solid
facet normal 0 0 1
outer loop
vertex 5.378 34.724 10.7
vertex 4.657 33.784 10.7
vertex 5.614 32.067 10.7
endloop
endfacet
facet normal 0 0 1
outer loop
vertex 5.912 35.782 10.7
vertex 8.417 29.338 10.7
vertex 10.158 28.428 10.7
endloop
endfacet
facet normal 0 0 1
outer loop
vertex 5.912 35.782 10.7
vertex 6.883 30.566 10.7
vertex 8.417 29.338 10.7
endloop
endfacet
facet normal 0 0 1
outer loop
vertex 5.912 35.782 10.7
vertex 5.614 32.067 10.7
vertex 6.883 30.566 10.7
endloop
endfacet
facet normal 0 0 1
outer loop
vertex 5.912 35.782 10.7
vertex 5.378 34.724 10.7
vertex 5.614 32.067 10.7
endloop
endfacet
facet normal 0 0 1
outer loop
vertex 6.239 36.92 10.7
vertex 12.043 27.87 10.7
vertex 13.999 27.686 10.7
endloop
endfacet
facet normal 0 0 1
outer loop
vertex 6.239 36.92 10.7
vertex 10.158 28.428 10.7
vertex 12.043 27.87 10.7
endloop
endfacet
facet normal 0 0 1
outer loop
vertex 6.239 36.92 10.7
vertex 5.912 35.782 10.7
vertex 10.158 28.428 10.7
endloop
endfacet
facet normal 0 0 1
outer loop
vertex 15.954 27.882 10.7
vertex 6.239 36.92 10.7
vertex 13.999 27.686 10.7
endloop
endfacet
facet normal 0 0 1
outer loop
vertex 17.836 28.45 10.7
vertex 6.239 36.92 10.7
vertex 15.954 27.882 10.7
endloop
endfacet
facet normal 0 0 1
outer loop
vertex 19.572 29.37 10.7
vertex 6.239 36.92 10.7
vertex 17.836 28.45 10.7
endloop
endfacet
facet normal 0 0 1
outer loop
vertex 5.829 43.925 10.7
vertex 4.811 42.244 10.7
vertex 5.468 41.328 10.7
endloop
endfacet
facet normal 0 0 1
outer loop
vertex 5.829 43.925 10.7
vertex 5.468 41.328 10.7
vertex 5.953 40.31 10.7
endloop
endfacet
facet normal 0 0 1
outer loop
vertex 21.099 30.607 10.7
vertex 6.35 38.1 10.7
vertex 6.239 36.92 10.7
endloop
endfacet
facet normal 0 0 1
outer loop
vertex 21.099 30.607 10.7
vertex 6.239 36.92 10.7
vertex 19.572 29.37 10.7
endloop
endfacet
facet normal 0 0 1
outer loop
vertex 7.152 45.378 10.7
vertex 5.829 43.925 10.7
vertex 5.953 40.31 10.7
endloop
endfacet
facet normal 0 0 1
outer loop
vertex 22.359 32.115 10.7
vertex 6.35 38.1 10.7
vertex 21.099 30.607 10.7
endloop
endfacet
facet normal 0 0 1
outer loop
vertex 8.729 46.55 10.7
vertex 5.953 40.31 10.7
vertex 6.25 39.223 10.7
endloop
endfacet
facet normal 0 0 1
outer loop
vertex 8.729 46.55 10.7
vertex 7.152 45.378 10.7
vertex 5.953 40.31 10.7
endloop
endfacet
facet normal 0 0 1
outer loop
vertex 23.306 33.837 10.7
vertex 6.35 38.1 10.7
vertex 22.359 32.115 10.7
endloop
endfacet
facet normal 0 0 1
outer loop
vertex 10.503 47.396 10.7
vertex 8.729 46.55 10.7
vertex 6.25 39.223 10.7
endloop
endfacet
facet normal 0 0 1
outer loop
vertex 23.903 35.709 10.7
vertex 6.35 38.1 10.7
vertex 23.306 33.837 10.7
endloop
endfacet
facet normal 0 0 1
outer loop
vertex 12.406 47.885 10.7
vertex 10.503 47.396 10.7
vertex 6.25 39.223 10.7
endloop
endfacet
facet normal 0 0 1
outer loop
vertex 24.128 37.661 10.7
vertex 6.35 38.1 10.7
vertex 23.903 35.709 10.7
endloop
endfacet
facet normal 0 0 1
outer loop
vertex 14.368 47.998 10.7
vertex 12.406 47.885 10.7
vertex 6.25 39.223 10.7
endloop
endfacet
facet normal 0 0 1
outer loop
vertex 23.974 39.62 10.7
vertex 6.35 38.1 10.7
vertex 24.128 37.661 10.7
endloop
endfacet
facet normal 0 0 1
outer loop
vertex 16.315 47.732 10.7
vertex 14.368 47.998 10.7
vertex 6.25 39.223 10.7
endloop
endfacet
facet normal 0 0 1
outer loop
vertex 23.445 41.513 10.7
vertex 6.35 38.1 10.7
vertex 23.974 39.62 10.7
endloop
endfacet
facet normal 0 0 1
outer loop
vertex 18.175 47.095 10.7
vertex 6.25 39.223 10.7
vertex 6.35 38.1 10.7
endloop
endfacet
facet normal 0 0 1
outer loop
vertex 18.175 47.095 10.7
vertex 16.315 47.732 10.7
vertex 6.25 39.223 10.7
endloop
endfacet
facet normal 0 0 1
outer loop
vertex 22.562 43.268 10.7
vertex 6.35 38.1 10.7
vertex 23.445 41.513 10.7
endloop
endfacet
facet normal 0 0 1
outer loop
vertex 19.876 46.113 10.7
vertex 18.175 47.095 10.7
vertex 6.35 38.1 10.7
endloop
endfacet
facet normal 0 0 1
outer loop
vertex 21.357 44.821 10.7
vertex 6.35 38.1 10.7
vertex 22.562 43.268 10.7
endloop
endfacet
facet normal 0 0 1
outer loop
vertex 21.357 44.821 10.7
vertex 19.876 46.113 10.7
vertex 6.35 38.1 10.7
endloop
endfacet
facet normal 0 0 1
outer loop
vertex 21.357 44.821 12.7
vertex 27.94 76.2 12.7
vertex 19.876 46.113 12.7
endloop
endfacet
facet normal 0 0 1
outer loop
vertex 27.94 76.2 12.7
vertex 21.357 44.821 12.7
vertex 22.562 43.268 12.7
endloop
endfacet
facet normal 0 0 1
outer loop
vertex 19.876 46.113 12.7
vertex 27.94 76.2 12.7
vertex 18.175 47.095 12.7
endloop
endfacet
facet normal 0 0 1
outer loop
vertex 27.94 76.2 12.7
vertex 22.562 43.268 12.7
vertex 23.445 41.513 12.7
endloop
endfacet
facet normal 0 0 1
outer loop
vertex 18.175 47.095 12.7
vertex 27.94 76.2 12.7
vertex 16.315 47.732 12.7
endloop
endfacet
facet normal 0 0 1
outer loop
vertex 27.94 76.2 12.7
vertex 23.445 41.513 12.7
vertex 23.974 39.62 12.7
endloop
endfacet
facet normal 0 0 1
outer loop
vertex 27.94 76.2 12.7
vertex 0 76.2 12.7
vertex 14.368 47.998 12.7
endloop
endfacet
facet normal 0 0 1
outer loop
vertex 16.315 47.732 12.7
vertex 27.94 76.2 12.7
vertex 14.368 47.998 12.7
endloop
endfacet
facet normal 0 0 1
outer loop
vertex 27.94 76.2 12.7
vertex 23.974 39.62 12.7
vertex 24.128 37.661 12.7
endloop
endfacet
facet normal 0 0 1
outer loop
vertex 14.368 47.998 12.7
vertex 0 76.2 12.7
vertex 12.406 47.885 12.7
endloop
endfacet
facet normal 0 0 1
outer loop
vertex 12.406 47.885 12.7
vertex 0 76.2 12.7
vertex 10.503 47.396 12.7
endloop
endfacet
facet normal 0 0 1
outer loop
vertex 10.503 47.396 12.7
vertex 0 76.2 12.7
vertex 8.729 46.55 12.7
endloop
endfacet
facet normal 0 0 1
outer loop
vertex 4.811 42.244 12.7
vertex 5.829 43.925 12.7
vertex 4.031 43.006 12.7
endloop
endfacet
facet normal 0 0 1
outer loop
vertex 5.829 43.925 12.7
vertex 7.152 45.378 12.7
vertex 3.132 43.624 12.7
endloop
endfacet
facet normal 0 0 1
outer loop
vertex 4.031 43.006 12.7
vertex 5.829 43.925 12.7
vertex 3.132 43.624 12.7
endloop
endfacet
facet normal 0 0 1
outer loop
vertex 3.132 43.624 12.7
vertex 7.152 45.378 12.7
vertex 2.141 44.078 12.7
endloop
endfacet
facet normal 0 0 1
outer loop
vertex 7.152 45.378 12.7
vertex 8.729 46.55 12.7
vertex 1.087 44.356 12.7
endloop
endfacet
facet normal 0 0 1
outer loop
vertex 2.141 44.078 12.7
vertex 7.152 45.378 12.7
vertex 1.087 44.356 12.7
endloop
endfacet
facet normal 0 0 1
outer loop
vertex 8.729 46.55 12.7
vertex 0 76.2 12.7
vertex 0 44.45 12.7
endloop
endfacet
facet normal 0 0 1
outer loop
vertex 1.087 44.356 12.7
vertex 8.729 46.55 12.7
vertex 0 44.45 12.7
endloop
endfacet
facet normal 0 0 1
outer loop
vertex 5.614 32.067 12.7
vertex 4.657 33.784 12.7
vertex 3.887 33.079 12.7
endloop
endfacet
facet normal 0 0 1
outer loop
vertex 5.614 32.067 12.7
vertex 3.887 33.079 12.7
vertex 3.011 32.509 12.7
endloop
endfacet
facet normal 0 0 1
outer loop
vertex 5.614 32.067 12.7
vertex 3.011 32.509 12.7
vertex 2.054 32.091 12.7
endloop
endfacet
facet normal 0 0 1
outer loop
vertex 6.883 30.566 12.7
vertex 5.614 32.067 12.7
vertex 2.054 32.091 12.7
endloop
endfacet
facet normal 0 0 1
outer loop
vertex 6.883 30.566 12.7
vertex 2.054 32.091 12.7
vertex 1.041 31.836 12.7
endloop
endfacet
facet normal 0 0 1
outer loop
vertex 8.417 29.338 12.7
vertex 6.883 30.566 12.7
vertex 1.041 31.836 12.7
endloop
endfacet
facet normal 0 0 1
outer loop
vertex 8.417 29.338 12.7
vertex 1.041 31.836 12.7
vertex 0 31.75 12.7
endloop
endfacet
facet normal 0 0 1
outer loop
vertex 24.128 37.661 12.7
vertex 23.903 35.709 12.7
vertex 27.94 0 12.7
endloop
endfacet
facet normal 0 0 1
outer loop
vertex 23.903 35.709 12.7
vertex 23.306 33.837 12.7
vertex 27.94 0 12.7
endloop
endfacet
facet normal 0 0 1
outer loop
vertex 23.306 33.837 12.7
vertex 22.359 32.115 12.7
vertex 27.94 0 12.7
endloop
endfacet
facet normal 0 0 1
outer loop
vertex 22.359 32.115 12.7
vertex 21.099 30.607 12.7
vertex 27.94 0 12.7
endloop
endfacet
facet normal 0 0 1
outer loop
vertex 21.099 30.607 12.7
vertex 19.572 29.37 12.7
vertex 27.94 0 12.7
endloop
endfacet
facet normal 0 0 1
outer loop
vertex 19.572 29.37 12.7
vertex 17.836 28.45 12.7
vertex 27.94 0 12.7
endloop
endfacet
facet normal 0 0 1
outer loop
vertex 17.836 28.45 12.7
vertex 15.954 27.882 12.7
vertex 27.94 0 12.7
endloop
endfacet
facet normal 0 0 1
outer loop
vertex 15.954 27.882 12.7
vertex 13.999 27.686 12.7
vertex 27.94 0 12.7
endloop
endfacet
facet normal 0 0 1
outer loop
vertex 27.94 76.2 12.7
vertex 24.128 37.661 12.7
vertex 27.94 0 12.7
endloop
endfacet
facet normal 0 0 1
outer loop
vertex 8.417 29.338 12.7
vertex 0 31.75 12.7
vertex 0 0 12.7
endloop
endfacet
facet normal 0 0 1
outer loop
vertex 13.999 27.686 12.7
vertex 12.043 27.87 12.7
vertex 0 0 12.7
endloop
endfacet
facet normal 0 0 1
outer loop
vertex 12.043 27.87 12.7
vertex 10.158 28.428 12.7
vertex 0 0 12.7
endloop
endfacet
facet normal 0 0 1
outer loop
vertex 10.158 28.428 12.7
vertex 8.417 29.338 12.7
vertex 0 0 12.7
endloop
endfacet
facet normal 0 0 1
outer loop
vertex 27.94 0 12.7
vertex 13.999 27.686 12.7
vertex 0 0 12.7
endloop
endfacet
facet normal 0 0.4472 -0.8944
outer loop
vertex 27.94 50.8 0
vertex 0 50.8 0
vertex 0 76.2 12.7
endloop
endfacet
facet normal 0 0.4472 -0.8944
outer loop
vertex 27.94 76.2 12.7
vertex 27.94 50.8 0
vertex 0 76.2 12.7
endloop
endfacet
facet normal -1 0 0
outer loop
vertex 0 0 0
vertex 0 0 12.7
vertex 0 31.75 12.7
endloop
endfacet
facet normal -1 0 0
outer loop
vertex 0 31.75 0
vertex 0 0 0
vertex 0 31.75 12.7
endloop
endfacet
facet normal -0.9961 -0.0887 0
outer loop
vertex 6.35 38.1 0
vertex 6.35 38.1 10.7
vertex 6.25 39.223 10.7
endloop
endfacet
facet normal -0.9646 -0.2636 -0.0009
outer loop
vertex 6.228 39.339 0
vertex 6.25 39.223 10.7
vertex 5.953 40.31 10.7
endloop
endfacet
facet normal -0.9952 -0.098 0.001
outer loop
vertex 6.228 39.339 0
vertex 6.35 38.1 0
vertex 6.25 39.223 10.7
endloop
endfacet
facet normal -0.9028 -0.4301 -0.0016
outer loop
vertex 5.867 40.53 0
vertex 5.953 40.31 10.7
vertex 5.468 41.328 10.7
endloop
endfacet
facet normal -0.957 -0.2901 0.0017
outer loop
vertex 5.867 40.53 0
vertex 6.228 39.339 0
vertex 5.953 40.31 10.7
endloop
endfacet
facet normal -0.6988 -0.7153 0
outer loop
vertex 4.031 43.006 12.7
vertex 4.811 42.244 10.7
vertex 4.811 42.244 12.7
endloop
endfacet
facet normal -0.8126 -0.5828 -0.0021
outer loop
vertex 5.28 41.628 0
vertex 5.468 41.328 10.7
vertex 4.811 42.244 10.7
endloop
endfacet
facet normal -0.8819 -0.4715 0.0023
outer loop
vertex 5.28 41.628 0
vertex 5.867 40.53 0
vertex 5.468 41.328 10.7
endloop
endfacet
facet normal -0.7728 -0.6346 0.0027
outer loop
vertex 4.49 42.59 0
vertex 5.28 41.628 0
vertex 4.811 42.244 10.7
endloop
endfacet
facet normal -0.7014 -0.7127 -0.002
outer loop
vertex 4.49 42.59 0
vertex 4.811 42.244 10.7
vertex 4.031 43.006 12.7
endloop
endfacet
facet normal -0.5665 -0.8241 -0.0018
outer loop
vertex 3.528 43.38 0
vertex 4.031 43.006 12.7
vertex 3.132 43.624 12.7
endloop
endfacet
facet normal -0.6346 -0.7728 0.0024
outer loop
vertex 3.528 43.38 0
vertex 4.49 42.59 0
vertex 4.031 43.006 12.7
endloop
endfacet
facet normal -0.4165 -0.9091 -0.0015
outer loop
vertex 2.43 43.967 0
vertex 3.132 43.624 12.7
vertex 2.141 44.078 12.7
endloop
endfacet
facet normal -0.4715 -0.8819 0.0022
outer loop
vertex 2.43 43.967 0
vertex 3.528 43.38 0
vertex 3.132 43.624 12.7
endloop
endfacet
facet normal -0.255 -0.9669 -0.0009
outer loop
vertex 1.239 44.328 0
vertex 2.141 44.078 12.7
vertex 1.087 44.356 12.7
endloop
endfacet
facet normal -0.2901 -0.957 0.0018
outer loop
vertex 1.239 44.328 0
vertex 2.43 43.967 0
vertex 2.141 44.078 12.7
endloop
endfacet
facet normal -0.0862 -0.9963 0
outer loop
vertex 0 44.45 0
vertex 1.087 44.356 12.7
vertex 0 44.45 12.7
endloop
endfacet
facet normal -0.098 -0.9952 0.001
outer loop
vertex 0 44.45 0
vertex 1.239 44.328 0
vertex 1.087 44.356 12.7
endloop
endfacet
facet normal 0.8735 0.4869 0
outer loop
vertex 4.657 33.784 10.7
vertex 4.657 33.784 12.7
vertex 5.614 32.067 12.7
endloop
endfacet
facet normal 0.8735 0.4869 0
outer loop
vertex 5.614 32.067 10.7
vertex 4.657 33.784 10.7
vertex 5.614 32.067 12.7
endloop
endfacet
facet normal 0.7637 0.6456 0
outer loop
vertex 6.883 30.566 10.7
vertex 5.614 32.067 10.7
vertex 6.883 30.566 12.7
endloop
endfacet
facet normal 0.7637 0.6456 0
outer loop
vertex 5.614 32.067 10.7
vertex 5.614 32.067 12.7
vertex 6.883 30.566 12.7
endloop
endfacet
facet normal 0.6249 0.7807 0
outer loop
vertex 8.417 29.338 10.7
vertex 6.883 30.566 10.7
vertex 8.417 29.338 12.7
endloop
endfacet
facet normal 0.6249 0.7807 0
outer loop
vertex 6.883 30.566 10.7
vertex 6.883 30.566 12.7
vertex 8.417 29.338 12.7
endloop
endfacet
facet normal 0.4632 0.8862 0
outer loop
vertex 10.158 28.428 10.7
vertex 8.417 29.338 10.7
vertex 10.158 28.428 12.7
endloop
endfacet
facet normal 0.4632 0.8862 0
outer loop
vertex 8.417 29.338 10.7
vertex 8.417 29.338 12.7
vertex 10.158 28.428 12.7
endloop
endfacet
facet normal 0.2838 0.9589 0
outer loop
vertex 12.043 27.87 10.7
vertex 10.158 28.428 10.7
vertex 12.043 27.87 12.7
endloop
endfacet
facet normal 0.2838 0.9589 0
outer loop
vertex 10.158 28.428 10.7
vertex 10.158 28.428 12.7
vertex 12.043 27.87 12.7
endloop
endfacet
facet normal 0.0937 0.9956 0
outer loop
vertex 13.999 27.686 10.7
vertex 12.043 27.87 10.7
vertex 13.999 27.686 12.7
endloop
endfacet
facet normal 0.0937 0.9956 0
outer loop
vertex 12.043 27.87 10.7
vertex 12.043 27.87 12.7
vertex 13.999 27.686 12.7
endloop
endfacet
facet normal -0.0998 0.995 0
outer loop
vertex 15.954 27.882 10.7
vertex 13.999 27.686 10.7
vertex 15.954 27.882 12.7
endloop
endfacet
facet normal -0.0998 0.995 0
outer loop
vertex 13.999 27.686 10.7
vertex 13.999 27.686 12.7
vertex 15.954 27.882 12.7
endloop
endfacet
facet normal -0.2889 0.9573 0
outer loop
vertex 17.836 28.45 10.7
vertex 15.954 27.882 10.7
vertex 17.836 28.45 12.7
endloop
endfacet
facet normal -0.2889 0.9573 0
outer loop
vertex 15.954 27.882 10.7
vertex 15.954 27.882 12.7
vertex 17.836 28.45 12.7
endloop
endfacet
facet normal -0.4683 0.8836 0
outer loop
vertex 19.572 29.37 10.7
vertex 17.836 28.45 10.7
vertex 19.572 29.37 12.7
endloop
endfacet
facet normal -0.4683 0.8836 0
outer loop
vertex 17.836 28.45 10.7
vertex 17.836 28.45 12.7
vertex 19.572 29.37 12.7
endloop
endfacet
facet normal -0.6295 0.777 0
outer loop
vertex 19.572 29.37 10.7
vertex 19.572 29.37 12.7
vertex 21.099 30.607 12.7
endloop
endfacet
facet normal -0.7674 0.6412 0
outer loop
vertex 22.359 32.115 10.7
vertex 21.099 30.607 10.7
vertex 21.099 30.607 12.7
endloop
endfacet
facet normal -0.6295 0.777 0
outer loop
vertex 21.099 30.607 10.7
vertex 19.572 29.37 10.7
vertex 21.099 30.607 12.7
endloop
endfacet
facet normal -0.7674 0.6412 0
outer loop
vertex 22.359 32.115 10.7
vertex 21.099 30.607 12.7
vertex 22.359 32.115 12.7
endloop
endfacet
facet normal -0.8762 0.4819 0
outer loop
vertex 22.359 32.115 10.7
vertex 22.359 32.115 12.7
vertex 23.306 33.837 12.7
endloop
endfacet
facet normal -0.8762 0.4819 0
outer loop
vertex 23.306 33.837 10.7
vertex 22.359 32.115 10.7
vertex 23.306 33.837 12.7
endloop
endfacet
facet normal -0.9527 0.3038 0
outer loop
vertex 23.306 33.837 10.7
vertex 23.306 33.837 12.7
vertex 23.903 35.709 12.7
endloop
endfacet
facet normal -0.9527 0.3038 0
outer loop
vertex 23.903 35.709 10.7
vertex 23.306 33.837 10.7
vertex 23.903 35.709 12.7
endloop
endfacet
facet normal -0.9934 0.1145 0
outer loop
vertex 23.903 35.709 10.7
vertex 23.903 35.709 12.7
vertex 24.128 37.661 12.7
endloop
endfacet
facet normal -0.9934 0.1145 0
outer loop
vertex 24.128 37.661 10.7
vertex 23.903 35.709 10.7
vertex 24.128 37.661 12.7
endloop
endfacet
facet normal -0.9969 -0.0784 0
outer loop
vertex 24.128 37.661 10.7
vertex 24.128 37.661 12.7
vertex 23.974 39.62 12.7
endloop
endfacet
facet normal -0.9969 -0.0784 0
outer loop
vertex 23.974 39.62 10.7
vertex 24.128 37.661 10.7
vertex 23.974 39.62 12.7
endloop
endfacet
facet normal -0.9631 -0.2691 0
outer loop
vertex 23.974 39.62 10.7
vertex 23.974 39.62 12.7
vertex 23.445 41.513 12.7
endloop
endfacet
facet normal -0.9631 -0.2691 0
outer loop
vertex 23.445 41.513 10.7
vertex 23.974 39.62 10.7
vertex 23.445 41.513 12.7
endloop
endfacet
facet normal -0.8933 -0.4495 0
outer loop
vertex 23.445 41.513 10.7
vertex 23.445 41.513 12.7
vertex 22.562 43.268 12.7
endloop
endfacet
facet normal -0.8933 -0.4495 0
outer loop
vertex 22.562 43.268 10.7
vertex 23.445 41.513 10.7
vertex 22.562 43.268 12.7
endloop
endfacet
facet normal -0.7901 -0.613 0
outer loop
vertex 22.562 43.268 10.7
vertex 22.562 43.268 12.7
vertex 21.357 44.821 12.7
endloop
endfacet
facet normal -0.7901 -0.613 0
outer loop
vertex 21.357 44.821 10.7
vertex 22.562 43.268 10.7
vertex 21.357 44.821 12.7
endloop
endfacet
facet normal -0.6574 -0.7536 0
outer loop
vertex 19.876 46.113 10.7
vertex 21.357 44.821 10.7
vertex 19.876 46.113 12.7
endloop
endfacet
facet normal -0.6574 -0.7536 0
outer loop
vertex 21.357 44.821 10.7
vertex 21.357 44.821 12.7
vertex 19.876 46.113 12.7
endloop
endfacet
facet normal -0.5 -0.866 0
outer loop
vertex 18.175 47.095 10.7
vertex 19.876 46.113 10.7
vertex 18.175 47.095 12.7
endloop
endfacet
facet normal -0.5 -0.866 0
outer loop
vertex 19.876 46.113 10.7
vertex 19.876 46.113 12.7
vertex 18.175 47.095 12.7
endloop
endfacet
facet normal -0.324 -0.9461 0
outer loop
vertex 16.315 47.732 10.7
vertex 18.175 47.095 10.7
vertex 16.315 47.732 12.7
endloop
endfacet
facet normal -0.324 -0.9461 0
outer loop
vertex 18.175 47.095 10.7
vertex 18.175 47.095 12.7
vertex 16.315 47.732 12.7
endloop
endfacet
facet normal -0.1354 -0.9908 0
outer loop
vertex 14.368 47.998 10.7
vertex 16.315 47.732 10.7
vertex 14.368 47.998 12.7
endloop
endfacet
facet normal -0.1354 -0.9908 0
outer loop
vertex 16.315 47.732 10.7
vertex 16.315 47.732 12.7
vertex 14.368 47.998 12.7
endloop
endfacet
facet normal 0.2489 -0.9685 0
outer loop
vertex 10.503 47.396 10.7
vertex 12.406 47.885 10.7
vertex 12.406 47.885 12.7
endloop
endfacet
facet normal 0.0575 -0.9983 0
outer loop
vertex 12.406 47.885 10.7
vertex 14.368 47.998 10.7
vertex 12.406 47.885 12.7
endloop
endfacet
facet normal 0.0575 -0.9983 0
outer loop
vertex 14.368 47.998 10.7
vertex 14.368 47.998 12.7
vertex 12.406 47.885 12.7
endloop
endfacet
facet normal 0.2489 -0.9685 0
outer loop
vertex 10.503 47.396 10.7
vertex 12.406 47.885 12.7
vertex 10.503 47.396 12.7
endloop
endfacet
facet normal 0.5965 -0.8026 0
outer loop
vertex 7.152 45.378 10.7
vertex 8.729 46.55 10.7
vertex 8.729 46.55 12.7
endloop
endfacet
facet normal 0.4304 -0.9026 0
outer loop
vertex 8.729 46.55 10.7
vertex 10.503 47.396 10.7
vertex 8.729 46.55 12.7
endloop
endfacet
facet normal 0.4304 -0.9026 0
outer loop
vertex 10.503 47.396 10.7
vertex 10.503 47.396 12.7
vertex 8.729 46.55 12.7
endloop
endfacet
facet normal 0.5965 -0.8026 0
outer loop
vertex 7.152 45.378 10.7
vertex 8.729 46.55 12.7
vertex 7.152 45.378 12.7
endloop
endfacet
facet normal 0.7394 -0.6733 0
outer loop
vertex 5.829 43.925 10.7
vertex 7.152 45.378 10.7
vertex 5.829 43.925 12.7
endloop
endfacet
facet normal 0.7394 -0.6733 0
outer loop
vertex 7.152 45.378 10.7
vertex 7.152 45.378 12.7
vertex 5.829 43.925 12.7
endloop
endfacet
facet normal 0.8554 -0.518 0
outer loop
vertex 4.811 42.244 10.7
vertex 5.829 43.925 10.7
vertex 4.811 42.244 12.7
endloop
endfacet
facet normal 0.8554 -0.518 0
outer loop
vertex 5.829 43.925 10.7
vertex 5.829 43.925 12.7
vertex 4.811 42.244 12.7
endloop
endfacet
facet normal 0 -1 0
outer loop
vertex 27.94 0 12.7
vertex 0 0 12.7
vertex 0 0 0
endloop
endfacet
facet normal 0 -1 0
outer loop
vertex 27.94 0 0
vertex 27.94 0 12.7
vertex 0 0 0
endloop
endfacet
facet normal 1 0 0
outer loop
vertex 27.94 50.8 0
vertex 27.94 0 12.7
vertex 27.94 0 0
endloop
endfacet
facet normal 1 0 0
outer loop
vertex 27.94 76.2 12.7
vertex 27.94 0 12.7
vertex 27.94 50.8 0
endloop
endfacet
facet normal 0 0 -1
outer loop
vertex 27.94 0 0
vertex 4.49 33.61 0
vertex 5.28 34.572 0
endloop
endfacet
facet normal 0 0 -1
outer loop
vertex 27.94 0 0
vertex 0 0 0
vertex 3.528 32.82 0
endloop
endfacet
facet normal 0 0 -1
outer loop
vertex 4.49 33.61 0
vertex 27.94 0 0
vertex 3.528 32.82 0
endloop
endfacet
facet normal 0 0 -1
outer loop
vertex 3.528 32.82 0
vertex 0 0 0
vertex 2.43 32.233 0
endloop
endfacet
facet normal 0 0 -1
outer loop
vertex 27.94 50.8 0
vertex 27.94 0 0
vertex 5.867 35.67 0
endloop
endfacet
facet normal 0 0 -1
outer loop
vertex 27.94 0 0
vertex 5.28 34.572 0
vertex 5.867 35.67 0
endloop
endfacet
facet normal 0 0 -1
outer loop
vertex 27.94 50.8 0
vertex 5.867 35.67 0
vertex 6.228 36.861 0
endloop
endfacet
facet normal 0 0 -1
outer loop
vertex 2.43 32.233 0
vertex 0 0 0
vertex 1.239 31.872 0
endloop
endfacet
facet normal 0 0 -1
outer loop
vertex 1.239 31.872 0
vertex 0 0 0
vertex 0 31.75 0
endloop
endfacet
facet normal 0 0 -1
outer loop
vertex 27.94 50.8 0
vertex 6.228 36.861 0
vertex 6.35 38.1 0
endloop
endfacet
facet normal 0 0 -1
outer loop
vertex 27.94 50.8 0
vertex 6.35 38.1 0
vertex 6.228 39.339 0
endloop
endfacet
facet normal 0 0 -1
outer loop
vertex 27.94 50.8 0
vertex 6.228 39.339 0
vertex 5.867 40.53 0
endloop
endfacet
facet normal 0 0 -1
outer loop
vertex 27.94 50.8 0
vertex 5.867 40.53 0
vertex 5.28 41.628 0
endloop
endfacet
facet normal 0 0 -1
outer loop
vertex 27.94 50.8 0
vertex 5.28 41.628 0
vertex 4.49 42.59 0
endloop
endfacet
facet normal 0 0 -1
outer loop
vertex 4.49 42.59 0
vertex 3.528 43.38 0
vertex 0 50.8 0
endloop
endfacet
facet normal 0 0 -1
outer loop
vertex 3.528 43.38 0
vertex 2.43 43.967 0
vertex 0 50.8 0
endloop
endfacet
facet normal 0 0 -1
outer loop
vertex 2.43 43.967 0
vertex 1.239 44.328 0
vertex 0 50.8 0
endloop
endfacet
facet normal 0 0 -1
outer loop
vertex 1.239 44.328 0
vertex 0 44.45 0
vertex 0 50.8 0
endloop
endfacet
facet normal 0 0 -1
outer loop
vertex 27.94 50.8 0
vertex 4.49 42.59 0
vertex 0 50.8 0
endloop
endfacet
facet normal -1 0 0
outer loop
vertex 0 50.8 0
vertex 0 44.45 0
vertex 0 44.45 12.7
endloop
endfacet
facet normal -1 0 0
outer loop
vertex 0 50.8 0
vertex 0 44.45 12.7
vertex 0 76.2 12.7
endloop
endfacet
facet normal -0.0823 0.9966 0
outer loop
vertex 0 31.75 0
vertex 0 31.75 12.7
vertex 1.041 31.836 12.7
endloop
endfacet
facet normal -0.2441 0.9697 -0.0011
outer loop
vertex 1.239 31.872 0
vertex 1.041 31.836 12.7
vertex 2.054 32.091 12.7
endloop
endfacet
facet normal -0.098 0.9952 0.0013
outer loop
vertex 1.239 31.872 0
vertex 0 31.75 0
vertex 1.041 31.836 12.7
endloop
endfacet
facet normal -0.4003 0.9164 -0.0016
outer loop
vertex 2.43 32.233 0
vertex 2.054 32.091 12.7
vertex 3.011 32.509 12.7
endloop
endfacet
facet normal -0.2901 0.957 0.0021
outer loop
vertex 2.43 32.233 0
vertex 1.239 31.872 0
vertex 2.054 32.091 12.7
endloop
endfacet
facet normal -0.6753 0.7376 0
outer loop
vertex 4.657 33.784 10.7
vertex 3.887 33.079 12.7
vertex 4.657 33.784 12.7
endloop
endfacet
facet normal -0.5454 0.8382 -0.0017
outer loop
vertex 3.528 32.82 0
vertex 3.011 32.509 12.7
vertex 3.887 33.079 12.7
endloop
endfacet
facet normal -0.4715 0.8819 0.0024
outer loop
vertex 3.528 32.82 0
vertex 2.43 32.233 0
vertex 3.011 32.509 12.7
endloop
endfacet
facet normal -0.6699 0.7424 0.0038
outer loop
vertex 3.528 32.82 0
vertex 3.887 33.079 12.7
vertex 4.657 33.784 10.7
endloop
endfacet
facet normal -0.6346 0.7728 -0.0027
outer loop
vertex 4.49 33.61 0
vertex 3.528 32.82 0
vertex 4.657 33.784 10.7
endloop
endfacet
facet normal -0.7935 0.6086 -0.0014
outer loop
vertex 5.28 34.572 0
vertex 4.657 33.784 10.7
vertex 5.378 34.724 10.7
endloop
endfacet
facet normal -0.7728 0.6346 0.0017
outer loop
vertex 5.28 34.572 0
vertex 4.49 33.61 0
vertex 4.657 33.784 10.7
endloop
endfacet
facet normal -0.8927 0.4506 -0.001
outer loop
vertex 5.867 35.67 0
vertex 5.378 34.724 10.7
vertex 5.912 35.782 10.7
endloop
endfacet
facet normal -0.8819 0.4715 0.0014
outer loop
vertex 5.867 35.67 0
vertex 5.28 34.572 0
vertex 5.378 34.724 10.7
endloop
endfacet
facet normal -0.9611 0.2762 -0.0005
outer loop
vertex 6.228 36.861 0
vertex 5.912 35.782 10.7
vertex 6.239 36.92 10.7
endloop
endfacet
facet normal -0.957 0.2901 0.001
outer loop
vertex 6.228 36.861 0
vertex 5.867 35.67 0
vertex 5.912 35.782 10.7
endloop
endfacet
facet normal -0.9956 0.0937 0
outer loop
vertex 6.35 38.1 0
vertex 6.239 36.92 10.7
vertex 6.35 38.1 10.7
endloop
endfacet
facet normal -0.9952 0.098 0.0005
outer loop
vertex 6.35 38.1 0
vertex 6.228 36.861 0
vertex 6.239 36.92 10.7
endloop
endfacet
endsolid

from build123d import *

# Parameters (mm, degrees)
F1_DEPTH = 27.94
F2_R     = 10.16
F3_DEPTH = 2
F5_DEPTH = 25.4


with BuildPart() as f1:
    # F0 (on Right) → F1 (new body)
    with BuildSketch(Plane.YZ):
        Polygon((0, 12.7), (0, 0), (50.8, 0), (76.2, 12.7), align=None)
    extrude(amount=F1_DEPTH)

    # F2 (on face) → F3 (cut)
    with BuildSketch(Plane.XY.offset(12.7)):
        with Locations((13.97, 37.846)):
            Circle(F2_R)
    extrude(amount=-F3_DEPTH, mode=Mode.SUBTRACT)

    # F4 (on Top) → F5 (cut)
    with BuildSketch(Plane.XY):
        with BuildLine():
            ThreePointArc((0, 44.45), (-6.35, 38.1), (0, 31.75))
            Line((0, 31.75), (0, 38.1))
            Line((0, 38.1), (0, 44.45))
        make_face()
        with BuildLine():
            Line((0, 38.1), (0, 31.75))
            ThreePointArc((0, 31.75), (4.490128, 33.609872), (6.35, 38.1))
            Line((6.35, 38.1), (0, 38.1))
        make_face()
        with BuildLine():
            Line((0, 44.45), (0, 38.1))
            Line((0, 38.1), (6.35, 38.1))
            ThreePointArc((6.35, 38.1), (4.490128, 42.590128), (0, 44.45))
        make_face()
    extrude(amount=F5_DEPTH, mode=Mode.SUBTRACT)


solid = f1.part
